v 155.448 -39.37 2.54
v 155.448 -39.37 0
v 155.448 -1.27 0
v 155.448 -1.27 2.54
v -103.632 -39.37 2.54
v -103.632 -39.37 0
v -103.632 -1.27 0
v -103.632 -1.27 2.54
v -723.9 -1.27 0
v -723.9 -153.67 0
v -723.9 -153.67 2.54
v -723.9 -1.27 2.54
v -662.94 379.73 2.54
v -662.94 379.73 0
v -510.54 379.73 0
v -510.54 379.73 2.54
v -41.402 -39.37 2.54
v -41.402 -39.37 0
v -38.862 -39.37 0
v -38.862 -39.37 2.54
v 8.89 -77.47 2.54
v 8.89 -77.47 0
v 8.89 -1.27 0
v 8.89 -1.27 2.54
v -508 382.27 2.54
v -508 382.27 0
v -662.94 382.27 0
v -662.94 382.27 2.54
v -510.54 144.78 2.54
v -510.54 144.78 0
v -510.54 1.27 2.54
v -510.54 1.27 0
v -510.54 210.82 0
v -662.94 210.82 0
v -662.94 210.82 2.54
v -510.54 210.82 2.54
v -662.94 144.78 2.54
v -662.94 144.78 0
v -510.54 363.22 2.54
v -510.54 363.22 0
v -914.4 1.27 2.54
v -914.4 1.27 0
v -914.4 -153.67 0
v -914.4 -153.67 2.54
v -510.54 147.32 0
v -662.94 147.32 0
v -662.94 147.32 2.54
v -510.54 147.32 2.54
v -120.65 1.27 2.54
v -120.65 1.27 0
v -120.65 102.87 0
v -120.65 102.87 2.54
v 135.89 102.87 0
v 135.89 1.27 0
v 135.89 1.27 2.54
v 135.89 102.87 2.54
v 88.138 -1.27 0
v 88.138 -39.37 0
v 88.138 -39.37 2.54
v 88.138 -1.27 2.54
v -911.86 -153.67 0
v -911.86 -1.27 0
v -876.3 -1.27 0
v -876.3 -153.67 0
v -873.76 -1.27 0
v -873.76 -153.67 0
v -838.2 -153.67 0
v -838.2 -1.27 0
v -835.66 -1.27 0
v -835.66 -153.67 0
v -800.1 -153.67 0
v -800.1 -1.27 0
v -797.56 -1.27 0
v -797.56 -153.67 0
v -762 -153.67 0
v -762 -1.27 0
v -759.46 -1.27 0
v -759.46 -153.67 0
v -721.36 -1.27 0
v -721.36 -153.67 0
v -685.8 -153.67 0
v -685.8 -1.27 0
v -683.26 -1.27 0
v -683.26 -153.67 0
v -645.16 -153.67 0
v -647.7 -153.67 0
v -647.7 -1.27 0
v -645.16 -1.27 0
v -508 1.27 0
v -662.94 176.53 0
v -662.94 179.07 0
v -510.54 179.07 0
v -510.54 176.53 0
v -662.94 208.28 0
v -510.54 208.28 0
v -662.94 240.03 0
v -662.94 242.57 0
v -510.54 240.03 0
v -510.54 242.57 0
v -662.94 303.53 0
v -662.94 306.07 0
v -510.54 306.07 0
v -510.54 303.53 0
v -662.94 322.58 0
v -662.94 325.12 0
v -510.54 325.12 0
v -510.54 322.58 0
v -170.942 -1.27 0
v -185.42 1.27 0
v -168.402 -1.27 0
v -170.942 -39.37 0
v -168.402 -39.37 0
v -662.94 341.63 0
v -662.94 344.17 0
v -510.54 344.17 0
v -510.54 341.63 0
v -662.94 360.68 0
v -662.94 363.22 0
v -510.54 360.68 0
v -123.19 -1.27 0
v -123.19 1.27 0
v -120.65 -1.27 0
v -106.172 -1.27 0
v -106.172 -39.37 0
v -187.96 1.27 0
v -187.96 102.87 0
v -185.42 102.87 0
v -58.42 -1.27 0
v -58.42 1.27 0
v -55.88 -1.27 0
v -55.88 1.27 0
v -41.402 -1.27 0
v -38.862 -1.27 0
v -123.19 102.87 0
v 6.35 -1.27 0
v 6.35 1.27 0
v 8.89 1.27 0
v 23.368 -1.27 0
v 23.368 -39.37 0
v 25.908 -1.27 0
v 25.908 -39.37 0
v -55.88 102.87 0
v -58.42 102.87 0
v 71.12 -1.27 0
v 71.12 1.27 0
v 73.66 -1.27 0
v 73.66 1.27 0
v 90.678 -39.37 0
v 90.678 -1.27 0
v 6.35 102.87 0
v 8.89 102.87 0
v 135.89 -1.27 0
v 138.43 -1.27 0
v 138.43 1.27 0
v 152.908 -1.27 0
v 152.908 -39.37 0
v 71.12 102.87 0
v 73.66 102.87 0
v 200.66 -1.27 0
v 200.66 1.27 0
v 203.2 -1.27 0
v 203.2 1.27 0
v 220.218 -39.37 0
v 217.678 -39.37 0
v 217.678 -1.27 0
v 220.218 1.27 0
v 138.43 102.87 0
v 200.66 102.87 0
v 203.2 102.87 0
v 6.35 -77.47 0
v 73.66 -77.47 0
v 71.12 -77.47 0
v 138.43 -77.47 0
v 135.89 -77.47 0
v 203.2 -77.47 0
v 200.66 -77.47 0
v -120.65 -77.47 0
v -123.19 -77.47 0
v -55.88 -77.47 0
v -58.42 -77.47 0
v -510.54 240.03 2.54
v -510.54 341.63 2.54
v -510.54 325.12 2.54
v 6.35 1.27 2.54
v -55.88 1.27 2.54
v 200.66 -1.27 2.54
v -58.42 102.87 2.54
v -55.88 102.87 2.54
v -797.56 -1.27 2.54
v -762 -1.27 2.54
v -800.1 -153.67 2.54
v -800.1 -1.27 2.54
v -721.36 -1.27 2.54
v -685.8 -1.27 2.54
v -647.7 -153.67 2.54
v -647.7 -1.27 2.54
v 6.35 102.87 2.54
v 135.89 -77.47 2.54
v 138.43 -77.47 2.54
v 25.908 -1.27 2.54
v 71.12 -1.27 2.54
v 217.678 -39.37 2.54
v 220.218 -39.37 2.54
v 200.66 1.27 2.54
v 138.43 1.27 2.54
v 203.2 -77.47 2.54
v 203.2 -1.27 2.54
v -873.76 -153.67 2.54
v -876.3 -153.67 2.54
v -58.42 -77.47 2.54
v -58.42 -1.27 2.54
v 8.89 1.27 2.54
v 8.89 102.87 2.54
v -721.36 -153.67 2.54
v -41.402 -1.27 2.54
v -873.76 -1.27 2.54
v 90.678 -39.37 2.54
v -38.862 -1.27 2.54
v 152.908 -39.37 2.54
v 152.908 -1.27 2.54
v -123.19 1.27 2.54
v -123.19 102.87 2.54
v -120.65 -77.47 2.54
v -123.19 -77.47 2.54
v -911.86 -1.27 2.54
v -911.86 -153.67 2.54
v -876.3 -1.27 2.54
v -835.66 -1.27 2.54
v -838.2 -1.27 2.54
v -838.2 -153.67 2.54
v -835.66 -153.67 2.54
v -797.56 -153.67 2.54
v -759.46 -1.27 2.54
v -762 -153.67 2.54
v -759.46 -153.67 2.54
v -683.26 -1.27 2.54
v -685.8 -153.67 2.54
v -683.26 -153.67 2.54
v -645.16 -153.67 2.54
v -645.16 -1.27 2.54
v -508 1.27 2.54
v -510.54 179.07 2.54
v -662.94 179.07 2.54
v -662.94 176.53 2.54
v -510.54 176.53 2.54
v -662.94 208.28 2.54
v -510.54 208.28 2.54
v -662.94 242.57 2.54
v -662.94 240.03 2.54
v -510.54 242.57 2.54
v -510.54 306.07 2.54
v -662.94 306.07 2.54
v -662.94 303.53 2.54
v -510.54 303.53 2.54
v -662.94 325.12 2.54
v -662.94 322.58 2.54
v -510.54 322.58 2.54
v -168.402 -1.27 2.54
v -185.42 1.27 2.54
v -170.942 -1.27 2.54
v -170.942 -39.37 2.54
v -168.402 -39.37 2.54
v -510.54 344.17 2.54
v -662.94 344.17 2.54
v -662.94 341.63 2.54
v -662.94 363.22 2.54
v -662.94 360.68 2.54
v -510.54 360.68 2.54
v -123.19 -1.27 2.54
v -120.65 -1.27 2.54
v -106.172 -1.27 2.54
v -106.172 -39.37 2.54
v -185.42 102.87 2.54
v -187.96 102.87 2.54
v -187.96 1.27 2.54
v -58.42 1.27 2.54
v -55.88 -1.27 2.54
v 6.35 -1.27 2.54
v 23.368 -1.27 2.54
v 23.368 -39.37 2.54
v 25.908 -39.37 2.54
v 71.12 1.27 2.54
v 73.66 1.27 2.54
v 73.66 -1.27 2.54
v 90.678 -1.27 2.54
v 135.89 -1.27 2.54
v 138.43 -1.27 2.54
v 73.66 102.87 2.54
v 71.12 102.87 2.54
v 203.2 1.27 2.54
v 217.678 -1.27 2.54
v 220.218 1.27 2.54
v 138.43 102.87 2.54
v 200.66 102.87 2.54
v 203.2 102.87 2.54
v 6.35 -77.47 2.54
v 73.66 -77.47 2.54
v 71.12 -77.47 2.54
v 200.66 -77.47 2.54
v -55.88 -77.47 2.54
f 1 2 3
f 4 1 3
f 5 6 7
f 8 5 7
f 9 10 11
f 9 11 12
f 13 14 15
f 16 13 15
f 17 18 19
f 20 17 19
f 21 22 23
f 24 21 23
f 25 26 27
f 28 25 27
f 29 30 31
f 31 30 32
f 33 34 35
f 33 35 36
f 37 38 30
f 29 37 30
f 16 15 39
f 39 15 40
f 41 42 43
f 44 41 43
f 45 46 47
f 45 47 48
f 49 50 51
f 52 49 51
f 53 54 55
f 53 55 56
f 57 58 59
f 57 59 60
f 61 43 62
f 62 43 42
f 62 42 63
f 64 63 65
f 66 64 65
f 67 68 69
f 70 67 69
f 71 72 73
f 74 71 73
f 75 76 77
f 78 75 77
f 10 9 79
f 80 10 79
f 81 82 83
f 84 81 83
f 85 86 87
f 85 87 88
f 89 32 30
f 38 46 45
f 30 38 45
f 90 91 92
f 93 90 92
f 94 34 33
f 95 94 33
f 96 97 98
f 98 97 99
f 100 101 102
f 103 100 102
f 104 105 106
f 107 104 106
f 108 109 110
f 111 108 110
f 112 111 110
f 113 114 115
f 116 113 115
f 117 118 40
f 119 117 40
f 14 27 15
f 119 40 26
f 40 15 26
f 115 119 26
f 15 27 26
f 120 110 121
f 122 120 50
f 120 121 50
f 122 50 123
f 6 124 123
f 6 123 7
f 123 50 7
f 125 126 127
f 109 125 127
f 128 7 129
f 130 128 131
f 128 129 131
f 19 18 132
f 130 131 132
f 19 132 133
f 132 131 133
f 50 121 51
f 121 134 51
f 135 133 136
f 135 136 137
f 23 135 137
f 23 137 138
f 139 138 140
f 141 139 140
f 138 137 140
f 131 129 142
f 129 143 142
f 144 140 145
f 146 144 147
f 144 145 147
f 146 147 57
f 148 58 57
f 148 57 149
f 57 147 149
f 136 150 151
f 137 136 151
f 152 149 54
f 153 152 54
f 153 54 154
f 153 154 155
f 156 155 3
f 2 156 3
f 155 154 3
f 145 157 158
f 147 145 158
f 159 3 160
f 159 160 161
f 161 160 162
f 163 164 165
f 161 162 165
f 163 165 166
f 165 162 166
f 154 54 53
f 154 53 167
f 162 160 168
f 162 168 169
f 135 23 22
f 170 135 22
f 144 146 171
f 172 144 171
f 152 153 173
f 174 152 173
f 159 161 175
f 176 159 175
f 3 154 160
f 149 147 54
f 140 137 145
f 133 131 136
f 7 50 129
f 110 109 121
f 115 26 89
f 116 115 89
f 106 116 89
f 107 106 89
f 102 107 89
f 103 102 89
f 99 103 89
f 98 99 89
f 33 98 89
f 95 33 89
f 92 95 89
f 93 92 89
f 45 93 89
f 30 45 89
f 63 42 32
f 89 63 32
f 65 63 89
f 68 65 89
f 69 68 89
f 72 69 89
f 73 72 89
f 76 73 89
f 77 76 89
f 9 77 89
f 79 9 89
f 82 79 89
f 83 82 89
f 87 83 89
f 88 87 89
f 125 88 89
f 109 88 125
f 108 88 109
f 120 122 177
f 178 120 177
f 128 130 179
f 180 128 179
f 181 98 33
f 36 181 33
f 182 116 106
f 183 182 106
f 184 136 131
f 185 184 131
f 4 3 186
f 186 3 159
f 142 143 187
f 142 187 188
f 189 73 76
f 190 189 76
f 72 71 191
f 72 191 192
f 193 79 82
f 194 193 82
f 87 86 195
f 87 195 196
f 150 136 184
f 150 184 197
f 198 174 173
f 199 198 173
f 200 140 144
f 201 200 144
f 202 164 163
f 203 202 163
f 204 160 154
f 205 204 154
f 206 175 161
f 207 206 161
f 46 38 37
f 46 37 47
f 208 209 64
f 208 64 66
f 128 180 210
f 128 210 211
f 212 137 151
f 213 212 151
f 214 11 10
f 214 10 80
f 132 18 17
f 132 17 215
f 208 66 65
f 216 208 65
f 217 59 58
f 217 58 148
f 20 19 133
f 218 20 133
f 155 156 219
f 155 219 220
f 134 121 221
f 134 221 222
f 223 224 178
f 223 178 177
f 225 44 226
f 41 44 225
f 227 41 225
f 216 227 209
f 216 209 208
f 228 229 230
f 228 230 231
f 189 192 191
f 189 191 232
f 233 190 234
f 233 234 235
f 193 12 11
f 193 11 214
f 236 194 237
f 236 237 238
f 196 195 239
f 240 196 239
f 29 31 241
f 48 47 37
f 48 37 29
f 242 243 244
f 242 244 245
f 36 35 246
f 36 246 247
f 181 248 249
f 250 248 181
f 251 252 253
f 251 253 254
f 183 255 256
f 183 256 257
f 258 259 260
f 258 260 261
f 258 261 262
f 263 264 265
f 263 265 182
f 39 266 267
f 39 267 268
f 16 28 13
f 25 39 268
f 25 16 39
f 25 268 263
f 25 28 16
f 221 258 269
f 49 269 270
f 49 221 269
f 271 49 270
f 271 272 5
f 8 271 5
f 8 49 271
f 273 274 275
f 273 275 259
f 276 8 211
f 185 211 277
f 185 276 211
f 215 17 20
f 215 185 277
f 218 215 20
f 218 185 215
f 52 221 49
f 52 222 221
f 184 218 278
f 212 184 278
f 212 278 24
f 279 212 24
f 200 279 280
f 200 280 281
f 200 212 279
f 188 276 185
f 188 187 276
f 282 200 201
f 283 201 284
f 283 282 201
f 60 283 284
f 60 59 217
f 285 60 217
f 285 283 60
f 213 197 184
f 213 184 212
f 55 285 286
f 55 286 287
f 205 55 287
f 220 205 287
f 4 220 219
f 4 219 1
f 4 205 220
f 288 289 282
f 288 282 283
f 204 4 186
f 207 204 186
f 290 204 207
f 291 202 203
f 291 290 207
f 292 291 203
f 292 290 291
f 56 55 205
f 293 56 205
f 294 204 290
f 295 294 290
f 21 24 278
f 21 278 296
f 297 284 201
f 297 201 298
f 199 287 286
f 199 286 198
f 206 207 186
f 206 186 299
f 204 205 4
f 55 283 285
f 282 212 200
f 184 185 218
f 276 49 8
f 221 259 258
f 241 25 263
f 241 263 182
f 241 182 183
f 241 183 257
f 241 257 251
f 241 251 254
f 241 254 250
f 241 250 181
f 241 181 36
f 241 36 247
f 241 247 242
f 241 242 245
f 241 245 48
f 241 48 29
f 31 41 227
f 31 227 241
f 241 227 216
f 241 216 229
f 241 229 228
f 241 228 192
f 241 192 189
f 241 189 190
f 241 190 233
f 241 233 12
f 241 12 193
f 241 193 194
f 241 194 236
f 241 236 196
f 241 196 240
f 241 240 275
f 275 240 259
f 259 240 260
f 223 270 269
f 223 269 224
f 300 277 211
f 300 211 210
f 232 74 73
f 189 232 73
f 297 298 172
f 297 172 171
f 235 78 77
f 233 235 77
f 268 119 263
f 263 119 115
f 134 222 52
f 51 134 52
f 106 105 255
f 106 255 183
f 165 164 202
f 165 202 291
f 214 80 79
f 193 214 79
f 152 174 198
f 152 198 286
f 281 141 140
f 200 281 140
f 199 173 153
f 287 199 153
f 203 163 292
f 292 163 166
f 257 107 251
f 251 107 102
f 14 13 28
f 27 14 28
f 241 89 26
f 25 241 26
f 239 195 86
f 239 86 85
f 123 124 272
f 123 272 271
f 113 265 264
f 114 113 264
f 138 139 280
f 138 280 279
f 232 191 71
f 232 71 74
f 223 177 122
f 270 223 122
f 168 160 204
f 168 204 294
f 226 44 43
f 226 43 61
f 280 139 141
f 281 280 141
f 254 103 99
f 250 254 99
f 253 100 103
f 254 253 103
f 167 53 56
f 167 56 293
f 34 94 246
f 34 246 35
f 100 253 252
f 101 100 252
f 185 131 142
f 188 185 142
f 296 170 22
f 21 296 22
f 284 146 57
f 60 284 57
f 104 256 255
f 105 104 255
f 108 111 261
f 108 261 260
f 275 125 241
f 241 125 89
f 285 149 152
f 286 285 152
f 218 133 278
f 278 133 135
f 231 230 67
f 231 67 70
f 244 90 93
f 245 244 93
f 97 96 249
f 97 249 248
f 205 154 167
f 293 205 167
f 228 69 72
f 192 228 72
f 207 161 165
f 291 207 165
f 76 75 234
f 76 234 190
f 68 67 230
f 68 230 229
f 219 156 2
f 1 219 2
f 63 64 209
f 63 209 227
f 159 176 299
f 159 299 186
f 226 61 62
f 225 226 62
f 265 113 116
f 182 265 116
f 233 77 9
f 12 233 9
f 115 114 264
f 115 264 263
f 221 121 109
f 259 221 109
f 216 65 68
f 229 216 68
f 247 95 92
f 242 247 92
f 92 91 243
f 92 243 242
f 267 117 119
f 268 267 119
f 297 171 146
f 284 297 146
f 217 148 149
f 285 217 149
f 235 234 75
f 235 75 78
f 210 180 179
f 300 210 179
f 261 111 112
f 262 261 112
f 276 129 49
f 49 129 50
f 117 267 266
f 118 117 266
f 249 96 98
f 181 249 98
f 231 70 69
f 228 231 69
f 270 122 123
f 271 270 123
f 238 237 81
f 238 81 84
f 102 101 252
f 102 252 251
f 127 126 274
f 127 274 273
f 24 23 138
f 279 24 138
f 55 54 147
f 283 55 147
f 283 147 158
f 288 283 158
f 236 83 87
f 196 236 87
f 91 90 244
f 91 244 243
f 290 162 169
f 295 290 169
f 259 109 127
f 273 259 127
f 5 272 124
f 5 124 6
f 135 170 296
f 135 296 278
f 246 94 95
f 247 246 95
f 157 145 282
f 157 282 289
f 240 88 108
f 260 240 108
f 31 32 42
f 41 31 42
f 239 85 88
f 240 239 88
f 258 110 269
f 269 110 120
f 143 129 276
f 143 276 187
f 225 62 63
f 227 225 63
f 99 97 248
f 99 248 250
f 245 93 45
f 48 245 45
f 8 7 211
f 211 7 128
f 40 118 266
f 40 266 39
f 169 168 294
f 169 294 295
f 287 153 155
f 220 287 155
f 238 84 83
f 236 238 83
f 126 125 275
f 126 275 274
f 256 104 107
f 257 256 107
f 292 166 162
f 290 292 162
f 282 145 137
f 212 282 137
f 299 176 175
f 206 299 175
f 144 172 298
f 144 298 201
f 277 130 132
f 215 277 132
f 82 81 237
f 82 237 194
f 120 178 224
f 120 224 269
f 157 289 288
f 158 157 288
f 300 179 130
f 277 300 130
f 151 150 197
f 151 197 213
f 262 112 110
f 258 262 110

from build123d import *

# Parameters (mm, degrees)
F0_W     = 2.54
F0_H     = 101.6
F0_H_2   = 76.2
F0_H_3   = 38.1
F0_W_2   = 304.8
F0_H_4   = 2.54
F0_H_5   = 152.4
F0_W_3   = 152.4
F1_DEPTH = 2.54


with BuildPart() as f1:
    # F0 (on Top) → F1 (new body)
    with BuildSketch(Plane.XY):
        Polygon((203.2, -1.27), (203.2, 1.27), (200.66, 1.27), (138.43, 1.27), (135.89, 1.27), (73.66, 1.27), (71.12, 1.27), (8.89, 1.27), (6.35, 1.27), (-55.88, 1.27), (-58.42, 1.27), (-120.65, 1.27), (-123.19, 1.27), (-185.42, 1.27), (-187.96, 1.27), (-203.2, 1.27), (-203.2, -1.27), (-187.96, -1.27), (-185.42, -1.27), (-170.942, -1.27), (-168.402, -1.27), (-123.19, -1.27), (-120.65, -1.27), (-106.172, -1.27), (-103.632, -1.27), (-58.42, -1.27), (-55.88, -1.27), (-41.402, -1.27), (-38.862, -1.27), (6.35, -1.27), (8.89, -1.27), (23.368, -1.27), (25.908, -1.27), (71.12, -1.27), (73.66, -1.27), (88.138, -1.27), (90.678, -1.27), (135.89, -1.27), (138.43, -1.27), (152.908, -1.27), (155.448, -1.27), (200.66, -1.27), align=None)
        Polygon((220.218, 1.27), (203.2, 1.27), (203.2, -1.27), (217.678, -1.27), (220.218, -1.27), align=None)
        with Locations((201.93, 52.07)):
            Rectangle(F0_W, F0_H)
        with Locations((201.93, -39.37)):
            Rectangle(F0_W, F0_H_2)
        with Locations((137.16, 52.07)):
            Rectangle(F0_W, F0_H)
        with Locations((218.948, -20.32)):
            Rectangle(F0_W, F0_H_3)
        with Locations((154.178, -20.32)):
            Rectangle(F0_W, F0_H_3)
        with Locations((72.39, 52.07)):
            Rectangle(F0_W, F0_H)
        with Locations((137.16, -39.37)):
            Rectangle(F0_W, F0_H_2)
        with Locations((7.62, 52.07)):
            Rectangle(F0_W, F0_H)
        with Locations((89.408, -20.32)):
            Rectangle(F0_W, F0_H_3)
        with Locations((-57.15, 52.07)):
            Rectangle(F0_W, F0_H)
        with Locations((72.39, -39.37)):
            Rectangle(F0_W, F0_H_2)
        with Locations((-121.92, 52.07)):
            Rectangle(F0_W, F0_H)
        with Locations((24.638, -20.32)):
            Rectangle(F0_W, F0_H_3)
        with Locations((-186.69, 52.07)):
            Rectangle(F0_W, F0_H)
        with Locations((7.62, -39.37)):
            Rectangle(F0_W, F0_H_2)
        with Locations((-355.6, 0)):
            Rectangle(F0_W_2, F0_H_4)
        Polygon((-508, -1.27), (-508, 1.27), (-510.54, 1.27), (-914.4, 1.27), (-914.4, -1.27), (-911.86, -1.27), (-876.3, -1.27), (-873.76, -1.27), (-838.2, -1.27), (-835.66, -1.27), (-800.1, -1.27), (-797.56, -1.27), (-762, -1.27), (-759.46, -1.27), (-723.9, -1.27), (-721.36, -1.27), (-685.8, -1.27), (-683.26, -1.27), (-647.7, -1.27), (-645.16, -1.27), align=None)
        Polygon((-510.54, 1.27), (-508, 1.27), (-508, 382.27), (-510.54, 382.27), (-510.54, 379.73), (-510.54, 363.22), (-510.54, 360.68), (-510.54, 344.17), (-510.54, 341.63), (-510.54, 325.12), (-510.54, 322.58), (-510.54, 306.07), (-510.54, 303.53), (-510.54, 242.57), (-510.54, 240.03), (-510.54, 210.82), (-510.54, 208.28), (-510.54, 179.07), (-510.54, 176.53), (-510.54, 147.32), (-510.54, 144.78), align=None)
        with Locations((-40.132, -20.32)):
            Rectangle(F0_W, F0_H_3)
        with Locations((-646.43, -77.47)):
            Rectangle(F0_W, F0_H_5)
        with Locations((-586.74, 146.05)):
            Rectangle(F0_W_3, F0_H_4)
        with Locations((-586.74, 381)):
            Rectangle(F0_W_3, F0_H_4)
        with Locations((-57.15, -39.37)):
            Rectangle(F0_W, F0_H_2)
        with Locations((-169.672, -20.32)):
            Rectangle(F0_W, F0_H_3)
        with Locations((-913.13, -77.47)):
            Rectangle(F0_W, F0_H_5)
        with Locations((-684.53, -77.47)):
            Rectangle(F0_W, F0_H_5)
        with Locations((-586.74, 177.8)):
            Rectangle(F0_W_3, F0_H_4)
        with Locations((-586.74, 361.95)):
            Rectangle(F0_W_3, F0_H_4)
        with Locations((-104.902, -20.32)):
            Rectangle(F0_W, F0_H_3)
        with Locations((-121.92, -39.37)):
            Rectangle(F0_W, F0_H_2)
        with Locations((-875.03, -77.47)):
            Rectangle(F0_W, F0_H_5)
        with Locations((-722.63, -77.47)):
            Rectangle(F0_W, F0_H_5)
        with Locations((-586.74, 209.55)):
            Rectangle(F0_W_3, F0_H_4)
        with Locations((-586.74, 342.9)):
            Rectangle(F0_W_3, F0_H_4)
        with Locations((-836.93, -77.47)):
            Rectangle(F0_W, F0_H_5)
        with Locations((-760.73, -77.47)):
            Rectangle(F0_W, F0_H_5)
        with Locations((-586.74, 241.3)):
            Rectangle(F0_W_3, F0_H_4)
        with Locations((-586.74, 323.85)):
            Rectangle(F0_W_3, F0_H_4)
        with Locations((-798.83, -77.47)):
            Rectangle(F0_W, F0_H_5)
        with Locations((-586.74, 304.8)):
            Rectangle(F0_W_3, F0_H_4)
    extrude(amount=F1_DEPTH)


solid = f1.part
